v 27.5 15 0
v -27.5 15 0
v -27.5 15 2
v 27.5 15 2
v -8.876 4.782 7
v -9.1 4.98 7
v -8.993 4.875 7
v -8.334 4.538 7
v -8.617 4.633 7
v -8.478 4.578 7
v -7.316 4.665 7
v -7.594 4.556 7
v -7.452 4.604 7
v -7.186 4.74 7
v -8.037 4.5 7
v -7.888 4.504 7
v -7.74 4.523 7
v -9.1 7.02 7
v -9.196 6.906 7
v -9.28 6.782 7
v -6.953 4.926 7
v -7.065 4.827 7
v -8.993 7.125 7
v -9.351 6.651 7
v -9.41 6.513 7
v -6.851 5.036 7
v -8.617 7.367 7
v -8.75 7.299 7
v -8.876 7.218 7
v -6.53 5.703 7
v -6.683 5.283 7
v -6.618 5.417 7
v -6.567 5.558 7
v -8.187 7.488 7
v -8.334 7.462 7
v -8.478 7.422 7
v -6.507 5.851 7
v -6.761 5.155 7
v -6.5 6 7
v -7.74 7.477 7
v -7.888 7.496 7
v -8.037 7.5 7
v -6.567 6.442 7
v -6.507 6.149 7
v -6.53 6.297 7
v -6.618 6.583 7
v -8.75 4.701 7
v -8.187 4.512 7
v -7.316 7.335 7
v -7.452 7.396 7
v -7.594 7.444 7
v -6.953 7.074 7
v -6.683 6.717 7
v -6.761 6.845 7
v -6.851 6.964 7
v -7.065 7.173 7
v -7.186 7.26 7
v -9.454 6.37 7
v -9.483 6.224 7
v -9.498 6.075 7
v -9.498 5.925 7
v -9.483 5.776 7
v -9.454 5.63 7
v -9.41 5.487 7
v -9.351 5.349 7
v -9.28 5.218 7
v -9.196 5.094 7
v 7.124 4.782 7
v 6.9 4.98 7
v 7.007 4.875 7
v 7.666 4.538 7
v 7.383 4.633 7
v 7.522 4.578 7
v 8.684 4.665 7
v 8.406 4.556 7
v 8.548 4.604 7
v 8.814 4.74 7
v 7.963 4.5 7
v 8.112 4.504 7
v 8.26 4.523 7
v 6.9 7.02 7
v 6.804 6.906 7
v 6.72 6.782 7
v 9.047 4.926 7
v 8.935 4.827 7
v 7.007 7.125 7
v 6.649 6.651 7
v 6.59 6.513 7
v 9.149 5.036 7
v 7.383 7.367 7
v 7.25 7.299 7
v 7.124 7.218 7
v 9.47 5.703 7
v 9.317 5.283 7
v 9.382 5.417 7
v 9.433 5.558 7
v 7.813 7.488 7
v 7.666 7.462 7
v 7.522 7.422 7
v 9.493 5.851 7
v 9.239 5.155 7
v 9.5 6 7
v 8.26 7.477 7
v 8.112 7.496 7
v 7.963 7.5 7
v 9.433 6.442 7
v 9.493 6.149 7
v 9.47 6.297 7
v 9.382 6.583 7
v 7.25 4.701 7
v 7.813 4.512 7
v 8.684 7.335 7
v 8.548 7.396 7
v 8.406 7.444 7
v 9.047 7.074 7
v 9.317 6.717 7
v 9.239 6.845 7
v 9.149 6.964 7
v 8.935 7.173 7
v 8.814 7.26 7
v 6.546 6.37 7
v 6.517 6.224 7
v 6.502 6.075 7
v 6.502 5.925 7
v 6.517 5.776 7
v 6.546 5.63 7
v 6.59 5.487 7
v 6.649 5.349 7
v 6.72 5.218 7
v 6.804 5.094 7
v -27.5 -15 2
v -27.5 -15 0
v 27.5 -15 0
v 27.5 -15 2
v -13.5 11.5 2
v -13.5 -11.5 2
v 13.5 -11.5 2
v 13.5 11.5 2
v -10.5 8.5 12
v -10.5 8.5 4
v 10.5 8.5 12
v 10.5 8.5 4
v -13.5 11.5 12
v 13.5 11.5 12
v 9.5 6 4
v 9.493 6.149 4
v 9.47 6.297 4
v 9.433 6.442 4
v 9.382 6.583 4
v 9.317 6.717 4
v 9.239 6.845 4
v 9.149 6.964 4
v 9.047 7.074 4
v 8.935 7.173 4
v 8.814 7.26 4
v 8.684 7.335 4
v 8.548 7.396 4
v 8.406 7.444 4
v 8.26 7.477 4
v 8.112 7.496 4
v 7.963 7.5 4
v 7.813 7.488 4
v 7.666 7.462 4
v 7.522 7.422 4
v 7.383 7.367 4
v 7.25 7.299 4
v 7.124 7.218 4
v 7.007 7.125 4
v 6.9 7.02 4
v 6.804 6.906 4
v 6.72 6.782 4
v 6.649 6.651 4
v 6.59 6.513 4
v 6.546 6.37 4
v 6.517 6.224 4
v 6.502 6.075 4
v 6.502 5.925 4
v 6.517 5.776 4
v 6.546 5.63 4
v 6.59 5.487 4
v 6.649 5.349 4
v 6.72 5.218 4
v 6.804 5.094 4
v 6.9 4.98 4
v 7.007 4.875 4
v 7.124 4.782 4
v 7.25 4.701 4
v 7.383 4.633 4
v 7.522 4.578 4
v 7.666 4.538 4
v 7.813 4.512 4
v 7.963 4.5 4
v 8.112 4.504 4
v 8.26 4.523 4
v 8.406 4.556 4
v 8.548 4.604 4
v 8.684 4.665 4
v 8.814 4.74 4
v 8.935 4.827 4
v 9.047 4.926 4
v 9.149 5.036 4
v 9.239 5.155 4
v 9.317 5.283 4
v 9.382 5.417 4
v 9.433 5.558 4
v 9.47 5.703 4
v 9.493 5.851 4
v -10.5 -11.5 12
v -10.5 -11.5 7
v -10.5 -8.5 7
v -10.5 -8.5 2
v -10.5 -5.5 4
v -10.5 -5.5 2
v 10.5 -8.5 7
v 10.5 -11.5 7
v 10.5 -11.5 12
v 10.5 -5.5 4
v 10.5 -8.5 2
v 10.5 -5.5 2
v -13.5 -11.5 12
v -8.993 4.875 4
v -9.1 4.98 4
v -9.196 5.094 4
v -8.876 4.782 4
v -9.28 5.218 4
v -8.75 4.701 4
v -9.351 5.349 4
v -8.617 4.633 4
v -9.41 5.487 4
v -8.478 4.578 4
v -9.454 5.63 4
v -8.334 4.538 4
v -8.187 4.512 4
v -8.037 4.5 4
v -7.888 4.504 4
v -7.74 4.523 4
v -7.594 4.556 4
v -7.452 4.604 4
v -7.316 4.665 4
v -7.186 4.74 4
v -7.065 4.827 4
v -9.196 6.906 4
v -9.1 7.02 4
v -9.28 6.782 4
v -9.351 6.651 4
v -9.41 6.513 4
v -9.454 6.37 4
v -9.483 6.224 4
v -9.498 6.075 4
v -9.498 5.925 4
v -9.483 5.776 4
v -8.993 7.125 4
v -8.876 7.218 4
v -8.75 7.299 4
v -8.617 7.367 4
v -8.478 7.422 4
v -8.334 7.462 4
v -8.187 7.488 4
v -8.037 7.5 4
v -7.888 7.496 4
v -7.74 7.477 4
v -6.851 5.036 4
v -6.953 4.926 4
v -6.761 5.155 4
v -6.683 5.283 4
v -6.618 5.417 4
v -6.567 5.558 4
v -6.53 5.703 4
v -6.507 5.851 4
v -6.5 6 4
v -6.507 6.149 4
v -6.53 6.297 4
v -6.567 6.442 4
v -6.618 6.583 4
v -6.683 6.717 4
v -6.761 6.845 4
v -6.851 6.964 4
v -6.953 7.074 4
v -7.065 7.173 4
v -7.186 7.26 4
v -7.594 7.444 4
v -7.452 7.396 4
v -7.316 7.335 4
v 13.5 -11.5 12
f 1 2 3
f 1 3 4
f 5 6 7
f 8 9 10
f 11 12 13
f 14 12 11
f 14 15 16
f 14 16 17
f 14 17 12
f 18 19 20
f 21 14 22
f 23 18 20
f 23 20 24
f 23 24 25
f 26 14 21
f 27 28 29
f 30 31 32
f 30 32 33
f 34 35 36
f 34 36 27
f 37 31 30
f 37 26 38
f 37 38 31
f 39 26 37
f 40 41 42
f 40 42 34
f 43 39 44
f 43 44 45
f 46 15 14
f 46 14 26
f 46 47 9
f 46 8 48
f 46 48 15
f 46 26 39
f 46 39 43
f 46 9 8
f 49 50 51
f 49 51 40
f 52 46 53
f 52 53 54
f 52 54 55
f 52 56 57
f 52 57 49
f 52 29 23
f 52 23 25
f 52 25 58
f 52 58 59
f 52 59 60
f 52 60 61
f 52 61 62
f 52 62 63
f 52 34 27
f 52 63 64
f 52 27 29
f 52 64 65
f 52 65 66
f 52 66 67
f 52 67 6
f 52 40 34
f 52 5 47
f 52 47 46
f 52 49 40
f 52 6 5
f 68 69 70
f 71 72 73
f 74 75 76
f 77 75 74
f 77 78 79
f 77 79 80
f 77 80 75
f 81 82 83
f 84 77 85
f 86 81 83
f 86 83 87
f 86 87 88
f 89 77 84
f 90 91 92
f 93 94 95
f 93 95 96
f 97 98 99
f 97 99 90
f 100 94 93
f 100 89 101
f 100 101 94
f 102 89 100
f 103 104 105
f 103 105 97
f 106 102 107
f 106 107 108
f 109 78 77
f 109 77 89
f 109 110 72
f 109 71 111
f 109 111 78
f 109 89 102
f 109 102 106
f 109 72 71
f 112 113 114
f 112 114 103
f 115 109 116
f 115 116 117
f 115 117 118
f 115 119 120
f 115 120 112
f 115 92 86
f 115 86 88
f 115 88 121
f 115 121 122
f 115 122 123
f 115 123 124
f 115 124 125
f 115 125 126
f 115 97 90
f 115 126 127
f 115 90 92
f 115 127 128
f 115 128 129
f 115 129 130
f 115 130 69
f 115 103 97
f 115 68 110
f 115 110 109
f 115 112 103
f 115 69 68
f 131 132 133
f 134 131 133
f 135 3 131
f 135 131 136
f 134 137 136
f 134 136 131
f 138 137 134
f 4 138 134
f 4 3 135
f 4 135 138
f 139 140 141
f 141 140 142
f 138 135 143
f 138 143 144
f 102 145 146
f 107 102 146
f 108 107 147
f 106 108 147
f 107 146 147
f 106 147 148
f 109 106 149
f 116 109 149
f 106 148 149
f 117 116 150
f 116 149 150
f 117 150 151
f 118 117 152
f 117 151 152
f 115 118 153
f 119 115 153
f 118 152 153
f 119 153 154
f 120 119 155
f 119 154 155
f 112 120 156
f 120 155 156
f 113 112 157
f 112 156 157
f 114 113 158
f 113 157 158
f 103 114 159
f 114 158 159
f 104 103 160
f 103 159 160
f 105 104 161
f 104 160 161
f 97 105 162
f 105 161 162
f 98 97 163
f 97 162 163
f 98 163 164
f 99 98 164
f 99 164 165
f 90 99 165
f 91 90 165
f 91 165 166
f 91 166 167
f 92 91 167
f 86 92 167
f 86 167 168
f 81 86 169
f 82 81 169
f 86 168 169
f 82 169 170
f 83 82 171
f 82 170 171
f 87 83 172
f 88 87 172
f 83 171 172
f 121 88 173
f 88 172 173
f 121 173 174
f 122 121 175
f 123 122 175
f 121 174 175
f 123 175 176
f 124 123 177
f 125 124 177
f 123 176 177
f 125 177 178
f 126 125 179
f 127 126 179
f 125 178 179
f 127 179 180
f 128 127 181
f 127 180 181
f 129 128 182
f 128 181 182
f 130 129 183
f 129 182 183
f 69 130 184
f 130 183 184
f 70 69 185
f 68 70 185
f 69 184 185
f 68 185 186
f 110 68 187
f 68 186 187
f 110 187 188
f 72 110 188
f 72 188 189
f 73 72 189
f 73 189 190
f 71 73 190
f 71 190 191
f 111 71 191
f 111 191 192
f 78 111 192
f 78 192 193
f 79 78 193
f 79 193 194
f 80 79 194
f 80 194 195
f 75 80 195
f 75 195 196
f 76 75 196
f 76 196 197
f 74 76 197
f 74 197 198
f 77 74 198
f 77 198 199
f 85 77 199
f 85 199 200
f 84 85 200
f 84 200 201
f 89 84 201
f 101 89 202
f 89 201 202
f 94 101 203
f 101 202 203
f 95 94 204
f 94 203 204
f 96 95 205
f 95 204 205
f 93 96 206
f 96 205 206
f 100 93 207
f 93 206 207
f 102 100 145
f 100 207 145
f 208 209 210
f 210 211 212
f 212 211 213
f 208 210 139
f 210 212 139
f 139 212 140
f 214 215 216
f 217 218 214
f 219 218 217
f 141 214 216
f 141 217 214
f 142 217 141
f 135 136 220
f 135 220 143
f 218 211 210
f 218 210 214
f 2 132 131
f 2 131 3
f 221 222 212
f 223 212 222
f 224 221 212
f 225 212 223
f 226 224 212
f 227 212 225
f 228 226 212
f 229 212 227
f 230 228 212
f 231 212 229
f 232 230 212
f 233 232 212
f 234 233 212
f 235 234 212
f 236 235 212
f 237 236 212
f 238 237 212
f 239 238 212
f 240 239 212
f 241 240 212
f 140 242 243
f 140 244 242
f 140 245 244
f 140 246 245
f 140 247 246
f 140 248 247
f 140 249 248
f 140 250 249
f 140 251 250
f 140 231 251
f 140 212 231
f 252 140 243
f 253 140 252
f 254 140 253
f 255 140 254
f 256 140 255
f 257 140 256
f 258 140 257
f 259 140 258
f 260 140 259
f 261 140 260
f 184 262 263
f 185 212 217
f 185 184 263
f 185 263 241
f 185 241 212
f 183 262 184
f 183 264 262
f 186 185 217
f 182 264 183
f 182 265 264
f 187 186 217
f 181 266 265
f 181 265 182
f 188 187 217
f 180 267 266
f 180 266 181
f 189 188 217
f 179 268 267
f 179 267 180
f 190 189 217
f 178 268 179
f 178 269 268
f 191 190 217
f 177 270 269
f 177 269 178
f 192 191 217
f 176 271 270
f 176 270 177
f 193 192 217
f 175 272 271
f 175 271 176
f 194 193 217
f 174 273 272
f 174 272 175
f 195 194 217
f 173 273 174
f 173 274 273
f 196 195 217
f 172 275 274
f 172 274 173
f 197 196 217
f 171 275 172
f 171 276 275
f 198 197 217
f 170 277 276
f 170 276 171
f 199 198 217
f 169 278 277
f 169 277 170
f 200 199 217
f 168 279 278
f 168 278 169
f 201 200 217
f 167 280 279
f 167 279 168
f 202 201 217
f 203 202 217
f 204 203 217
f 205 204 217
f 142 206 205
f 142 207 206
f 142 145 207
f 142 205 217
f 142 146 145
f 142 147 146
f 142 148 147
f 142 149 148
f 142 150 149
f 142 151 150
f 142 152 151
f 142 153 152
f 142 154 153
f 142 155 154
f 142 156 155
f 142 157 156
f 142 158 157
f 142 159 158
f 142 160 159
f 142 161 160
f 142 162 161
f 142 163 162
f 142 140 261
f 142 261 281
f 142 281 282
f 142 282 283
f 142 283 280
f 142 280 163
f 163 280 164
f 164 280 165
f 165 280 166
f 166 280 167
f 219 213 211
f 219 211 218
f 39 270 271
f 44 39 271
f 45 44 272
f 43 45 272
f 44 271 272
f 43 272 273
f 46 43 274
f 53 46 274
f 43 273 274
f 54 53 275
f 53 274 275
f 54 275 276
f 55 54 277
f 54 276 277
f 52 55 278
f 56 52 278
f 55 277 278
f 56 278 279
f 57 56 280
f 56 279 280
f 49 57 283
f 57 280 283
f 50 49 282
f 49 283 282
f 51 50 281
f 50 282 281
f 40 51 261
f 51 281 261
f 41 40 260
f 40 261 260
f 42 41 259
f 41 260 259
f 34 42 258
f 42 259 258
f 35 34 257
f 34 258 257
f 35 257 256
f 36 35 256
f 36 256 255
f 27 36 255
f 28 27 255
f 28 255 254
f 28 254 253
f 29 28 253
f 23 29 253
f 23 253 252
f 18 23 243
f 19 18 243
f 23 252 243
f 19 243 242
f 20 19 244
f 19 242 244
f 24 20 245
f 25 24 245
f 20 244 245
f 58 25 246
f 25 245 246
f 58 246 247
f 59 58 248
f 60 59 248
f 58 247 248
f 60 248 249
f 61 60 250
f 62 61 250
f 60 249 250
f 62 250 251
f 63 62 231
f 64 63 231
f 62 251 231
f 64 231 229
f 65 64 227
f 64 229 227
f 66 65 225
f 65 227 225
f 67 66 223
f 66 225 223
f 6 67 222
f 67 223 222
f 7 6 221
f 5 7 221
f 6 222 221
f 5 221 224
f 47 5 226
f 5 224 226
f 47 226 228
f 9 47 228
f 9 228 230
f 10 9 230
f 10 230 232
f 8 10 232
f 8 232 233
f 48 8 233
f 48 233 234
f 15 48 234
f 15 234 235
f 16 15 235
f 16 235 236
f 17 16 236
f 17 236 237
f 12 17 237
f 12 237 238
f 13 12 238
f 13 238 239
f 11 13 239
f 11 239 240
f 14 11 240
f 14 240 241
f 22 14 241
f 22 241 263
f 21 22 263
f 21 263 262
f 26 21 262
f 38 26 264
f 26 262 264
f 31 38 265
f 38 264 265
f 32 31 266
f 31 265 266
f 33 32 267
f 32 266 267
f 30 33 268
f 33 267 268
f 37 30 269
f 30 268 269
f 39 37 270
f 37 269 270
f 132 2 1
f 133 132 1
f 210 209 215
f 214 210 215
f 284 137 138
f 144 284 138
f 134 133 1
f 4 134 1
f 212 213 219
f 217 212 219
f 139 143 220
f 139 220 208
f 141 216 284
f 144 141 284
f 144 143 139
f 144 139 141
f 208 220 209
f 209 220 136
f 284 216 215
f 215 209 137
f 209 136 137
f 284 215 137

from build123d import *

# Parameters (mm, degrees)
SKETCH1_W           = 55
SKETCH1_H           = 30
BOSS_EXTRUDE2_DEPTH = 2
SKETCH8_W           = 27
SKETCH8_H           = 23
SKETCH8_W_2         = 21
SKETCH8_H_2         = 17
BOSS_EXTRUDE3_DEPTH = 10
SKETCH10_W          = 21
SKETCH10_H          = 14
BOSS_EXTRUDE4_DEPTH = 2
SKETCH13_W          = 21
SKETCH13_H          = 5
CUT_EXTRUDE3_DEPTH  = 3
SKETCH14_R          = 1.5
BOSS_EXTRUDE5_DEPTH = 3


with BuildPart() as part:
    # Sketch1 → Boss-Extrude2 (new body)
    with BuildSketch(Plane.XY):
        Rectangle(SKETCH1_W, SKETCH1_H)
    extrude(amount=BOSS_EXTRUDE2_DEPTH)

    # Sketch8 → Boss-Extrude3 (add)
    with BuildSketch(Plane.XY.offset(2)):
        Rectangle(SKETCH8_W, SKETCH8_H)
        Rectangle(SKETCH8_W_2, SKETCH8_H_2, mode=Mode.SUBTRACT)
    extrude(amount=BOSS_EXTRUDE3_DEPTH)

    # Sketch10 → Boss-Extrude4 (add)
    with BuildSketch(Plane.XY.offset(2)):
        with Locations((0, 1.5)):
            Rectangle(SKETCH10_W, SKETCH10_H)
    extrude(amount=BOSS_EXTRUDE4_DEPTH)

    # Sketch13 → Cut-Extrude3 (cut)
    with BuildSketch(Plane.XZ.offset(11.5)):
        with Locations((0, 9.5)):
            Rectangle(SKETCH13_W, SKETCH13_H)
    extrude(amount=-CUT_EXTRUDE3_DEPTH, mode=Mode.SUBTRACT)

    # Sketch14 → Boss-Extrude5 (add)
    with BuildSketch(Plane.XY.offset(4)):
        with Locations((-8, 6)):
            Circle(SKETCH14_R)
        with Locations((8, 6)):
            Circle(SKETCH14_R)
    extrude(amount=BOSS_EXTRUDE5_DEPTH)


solid = part.part
